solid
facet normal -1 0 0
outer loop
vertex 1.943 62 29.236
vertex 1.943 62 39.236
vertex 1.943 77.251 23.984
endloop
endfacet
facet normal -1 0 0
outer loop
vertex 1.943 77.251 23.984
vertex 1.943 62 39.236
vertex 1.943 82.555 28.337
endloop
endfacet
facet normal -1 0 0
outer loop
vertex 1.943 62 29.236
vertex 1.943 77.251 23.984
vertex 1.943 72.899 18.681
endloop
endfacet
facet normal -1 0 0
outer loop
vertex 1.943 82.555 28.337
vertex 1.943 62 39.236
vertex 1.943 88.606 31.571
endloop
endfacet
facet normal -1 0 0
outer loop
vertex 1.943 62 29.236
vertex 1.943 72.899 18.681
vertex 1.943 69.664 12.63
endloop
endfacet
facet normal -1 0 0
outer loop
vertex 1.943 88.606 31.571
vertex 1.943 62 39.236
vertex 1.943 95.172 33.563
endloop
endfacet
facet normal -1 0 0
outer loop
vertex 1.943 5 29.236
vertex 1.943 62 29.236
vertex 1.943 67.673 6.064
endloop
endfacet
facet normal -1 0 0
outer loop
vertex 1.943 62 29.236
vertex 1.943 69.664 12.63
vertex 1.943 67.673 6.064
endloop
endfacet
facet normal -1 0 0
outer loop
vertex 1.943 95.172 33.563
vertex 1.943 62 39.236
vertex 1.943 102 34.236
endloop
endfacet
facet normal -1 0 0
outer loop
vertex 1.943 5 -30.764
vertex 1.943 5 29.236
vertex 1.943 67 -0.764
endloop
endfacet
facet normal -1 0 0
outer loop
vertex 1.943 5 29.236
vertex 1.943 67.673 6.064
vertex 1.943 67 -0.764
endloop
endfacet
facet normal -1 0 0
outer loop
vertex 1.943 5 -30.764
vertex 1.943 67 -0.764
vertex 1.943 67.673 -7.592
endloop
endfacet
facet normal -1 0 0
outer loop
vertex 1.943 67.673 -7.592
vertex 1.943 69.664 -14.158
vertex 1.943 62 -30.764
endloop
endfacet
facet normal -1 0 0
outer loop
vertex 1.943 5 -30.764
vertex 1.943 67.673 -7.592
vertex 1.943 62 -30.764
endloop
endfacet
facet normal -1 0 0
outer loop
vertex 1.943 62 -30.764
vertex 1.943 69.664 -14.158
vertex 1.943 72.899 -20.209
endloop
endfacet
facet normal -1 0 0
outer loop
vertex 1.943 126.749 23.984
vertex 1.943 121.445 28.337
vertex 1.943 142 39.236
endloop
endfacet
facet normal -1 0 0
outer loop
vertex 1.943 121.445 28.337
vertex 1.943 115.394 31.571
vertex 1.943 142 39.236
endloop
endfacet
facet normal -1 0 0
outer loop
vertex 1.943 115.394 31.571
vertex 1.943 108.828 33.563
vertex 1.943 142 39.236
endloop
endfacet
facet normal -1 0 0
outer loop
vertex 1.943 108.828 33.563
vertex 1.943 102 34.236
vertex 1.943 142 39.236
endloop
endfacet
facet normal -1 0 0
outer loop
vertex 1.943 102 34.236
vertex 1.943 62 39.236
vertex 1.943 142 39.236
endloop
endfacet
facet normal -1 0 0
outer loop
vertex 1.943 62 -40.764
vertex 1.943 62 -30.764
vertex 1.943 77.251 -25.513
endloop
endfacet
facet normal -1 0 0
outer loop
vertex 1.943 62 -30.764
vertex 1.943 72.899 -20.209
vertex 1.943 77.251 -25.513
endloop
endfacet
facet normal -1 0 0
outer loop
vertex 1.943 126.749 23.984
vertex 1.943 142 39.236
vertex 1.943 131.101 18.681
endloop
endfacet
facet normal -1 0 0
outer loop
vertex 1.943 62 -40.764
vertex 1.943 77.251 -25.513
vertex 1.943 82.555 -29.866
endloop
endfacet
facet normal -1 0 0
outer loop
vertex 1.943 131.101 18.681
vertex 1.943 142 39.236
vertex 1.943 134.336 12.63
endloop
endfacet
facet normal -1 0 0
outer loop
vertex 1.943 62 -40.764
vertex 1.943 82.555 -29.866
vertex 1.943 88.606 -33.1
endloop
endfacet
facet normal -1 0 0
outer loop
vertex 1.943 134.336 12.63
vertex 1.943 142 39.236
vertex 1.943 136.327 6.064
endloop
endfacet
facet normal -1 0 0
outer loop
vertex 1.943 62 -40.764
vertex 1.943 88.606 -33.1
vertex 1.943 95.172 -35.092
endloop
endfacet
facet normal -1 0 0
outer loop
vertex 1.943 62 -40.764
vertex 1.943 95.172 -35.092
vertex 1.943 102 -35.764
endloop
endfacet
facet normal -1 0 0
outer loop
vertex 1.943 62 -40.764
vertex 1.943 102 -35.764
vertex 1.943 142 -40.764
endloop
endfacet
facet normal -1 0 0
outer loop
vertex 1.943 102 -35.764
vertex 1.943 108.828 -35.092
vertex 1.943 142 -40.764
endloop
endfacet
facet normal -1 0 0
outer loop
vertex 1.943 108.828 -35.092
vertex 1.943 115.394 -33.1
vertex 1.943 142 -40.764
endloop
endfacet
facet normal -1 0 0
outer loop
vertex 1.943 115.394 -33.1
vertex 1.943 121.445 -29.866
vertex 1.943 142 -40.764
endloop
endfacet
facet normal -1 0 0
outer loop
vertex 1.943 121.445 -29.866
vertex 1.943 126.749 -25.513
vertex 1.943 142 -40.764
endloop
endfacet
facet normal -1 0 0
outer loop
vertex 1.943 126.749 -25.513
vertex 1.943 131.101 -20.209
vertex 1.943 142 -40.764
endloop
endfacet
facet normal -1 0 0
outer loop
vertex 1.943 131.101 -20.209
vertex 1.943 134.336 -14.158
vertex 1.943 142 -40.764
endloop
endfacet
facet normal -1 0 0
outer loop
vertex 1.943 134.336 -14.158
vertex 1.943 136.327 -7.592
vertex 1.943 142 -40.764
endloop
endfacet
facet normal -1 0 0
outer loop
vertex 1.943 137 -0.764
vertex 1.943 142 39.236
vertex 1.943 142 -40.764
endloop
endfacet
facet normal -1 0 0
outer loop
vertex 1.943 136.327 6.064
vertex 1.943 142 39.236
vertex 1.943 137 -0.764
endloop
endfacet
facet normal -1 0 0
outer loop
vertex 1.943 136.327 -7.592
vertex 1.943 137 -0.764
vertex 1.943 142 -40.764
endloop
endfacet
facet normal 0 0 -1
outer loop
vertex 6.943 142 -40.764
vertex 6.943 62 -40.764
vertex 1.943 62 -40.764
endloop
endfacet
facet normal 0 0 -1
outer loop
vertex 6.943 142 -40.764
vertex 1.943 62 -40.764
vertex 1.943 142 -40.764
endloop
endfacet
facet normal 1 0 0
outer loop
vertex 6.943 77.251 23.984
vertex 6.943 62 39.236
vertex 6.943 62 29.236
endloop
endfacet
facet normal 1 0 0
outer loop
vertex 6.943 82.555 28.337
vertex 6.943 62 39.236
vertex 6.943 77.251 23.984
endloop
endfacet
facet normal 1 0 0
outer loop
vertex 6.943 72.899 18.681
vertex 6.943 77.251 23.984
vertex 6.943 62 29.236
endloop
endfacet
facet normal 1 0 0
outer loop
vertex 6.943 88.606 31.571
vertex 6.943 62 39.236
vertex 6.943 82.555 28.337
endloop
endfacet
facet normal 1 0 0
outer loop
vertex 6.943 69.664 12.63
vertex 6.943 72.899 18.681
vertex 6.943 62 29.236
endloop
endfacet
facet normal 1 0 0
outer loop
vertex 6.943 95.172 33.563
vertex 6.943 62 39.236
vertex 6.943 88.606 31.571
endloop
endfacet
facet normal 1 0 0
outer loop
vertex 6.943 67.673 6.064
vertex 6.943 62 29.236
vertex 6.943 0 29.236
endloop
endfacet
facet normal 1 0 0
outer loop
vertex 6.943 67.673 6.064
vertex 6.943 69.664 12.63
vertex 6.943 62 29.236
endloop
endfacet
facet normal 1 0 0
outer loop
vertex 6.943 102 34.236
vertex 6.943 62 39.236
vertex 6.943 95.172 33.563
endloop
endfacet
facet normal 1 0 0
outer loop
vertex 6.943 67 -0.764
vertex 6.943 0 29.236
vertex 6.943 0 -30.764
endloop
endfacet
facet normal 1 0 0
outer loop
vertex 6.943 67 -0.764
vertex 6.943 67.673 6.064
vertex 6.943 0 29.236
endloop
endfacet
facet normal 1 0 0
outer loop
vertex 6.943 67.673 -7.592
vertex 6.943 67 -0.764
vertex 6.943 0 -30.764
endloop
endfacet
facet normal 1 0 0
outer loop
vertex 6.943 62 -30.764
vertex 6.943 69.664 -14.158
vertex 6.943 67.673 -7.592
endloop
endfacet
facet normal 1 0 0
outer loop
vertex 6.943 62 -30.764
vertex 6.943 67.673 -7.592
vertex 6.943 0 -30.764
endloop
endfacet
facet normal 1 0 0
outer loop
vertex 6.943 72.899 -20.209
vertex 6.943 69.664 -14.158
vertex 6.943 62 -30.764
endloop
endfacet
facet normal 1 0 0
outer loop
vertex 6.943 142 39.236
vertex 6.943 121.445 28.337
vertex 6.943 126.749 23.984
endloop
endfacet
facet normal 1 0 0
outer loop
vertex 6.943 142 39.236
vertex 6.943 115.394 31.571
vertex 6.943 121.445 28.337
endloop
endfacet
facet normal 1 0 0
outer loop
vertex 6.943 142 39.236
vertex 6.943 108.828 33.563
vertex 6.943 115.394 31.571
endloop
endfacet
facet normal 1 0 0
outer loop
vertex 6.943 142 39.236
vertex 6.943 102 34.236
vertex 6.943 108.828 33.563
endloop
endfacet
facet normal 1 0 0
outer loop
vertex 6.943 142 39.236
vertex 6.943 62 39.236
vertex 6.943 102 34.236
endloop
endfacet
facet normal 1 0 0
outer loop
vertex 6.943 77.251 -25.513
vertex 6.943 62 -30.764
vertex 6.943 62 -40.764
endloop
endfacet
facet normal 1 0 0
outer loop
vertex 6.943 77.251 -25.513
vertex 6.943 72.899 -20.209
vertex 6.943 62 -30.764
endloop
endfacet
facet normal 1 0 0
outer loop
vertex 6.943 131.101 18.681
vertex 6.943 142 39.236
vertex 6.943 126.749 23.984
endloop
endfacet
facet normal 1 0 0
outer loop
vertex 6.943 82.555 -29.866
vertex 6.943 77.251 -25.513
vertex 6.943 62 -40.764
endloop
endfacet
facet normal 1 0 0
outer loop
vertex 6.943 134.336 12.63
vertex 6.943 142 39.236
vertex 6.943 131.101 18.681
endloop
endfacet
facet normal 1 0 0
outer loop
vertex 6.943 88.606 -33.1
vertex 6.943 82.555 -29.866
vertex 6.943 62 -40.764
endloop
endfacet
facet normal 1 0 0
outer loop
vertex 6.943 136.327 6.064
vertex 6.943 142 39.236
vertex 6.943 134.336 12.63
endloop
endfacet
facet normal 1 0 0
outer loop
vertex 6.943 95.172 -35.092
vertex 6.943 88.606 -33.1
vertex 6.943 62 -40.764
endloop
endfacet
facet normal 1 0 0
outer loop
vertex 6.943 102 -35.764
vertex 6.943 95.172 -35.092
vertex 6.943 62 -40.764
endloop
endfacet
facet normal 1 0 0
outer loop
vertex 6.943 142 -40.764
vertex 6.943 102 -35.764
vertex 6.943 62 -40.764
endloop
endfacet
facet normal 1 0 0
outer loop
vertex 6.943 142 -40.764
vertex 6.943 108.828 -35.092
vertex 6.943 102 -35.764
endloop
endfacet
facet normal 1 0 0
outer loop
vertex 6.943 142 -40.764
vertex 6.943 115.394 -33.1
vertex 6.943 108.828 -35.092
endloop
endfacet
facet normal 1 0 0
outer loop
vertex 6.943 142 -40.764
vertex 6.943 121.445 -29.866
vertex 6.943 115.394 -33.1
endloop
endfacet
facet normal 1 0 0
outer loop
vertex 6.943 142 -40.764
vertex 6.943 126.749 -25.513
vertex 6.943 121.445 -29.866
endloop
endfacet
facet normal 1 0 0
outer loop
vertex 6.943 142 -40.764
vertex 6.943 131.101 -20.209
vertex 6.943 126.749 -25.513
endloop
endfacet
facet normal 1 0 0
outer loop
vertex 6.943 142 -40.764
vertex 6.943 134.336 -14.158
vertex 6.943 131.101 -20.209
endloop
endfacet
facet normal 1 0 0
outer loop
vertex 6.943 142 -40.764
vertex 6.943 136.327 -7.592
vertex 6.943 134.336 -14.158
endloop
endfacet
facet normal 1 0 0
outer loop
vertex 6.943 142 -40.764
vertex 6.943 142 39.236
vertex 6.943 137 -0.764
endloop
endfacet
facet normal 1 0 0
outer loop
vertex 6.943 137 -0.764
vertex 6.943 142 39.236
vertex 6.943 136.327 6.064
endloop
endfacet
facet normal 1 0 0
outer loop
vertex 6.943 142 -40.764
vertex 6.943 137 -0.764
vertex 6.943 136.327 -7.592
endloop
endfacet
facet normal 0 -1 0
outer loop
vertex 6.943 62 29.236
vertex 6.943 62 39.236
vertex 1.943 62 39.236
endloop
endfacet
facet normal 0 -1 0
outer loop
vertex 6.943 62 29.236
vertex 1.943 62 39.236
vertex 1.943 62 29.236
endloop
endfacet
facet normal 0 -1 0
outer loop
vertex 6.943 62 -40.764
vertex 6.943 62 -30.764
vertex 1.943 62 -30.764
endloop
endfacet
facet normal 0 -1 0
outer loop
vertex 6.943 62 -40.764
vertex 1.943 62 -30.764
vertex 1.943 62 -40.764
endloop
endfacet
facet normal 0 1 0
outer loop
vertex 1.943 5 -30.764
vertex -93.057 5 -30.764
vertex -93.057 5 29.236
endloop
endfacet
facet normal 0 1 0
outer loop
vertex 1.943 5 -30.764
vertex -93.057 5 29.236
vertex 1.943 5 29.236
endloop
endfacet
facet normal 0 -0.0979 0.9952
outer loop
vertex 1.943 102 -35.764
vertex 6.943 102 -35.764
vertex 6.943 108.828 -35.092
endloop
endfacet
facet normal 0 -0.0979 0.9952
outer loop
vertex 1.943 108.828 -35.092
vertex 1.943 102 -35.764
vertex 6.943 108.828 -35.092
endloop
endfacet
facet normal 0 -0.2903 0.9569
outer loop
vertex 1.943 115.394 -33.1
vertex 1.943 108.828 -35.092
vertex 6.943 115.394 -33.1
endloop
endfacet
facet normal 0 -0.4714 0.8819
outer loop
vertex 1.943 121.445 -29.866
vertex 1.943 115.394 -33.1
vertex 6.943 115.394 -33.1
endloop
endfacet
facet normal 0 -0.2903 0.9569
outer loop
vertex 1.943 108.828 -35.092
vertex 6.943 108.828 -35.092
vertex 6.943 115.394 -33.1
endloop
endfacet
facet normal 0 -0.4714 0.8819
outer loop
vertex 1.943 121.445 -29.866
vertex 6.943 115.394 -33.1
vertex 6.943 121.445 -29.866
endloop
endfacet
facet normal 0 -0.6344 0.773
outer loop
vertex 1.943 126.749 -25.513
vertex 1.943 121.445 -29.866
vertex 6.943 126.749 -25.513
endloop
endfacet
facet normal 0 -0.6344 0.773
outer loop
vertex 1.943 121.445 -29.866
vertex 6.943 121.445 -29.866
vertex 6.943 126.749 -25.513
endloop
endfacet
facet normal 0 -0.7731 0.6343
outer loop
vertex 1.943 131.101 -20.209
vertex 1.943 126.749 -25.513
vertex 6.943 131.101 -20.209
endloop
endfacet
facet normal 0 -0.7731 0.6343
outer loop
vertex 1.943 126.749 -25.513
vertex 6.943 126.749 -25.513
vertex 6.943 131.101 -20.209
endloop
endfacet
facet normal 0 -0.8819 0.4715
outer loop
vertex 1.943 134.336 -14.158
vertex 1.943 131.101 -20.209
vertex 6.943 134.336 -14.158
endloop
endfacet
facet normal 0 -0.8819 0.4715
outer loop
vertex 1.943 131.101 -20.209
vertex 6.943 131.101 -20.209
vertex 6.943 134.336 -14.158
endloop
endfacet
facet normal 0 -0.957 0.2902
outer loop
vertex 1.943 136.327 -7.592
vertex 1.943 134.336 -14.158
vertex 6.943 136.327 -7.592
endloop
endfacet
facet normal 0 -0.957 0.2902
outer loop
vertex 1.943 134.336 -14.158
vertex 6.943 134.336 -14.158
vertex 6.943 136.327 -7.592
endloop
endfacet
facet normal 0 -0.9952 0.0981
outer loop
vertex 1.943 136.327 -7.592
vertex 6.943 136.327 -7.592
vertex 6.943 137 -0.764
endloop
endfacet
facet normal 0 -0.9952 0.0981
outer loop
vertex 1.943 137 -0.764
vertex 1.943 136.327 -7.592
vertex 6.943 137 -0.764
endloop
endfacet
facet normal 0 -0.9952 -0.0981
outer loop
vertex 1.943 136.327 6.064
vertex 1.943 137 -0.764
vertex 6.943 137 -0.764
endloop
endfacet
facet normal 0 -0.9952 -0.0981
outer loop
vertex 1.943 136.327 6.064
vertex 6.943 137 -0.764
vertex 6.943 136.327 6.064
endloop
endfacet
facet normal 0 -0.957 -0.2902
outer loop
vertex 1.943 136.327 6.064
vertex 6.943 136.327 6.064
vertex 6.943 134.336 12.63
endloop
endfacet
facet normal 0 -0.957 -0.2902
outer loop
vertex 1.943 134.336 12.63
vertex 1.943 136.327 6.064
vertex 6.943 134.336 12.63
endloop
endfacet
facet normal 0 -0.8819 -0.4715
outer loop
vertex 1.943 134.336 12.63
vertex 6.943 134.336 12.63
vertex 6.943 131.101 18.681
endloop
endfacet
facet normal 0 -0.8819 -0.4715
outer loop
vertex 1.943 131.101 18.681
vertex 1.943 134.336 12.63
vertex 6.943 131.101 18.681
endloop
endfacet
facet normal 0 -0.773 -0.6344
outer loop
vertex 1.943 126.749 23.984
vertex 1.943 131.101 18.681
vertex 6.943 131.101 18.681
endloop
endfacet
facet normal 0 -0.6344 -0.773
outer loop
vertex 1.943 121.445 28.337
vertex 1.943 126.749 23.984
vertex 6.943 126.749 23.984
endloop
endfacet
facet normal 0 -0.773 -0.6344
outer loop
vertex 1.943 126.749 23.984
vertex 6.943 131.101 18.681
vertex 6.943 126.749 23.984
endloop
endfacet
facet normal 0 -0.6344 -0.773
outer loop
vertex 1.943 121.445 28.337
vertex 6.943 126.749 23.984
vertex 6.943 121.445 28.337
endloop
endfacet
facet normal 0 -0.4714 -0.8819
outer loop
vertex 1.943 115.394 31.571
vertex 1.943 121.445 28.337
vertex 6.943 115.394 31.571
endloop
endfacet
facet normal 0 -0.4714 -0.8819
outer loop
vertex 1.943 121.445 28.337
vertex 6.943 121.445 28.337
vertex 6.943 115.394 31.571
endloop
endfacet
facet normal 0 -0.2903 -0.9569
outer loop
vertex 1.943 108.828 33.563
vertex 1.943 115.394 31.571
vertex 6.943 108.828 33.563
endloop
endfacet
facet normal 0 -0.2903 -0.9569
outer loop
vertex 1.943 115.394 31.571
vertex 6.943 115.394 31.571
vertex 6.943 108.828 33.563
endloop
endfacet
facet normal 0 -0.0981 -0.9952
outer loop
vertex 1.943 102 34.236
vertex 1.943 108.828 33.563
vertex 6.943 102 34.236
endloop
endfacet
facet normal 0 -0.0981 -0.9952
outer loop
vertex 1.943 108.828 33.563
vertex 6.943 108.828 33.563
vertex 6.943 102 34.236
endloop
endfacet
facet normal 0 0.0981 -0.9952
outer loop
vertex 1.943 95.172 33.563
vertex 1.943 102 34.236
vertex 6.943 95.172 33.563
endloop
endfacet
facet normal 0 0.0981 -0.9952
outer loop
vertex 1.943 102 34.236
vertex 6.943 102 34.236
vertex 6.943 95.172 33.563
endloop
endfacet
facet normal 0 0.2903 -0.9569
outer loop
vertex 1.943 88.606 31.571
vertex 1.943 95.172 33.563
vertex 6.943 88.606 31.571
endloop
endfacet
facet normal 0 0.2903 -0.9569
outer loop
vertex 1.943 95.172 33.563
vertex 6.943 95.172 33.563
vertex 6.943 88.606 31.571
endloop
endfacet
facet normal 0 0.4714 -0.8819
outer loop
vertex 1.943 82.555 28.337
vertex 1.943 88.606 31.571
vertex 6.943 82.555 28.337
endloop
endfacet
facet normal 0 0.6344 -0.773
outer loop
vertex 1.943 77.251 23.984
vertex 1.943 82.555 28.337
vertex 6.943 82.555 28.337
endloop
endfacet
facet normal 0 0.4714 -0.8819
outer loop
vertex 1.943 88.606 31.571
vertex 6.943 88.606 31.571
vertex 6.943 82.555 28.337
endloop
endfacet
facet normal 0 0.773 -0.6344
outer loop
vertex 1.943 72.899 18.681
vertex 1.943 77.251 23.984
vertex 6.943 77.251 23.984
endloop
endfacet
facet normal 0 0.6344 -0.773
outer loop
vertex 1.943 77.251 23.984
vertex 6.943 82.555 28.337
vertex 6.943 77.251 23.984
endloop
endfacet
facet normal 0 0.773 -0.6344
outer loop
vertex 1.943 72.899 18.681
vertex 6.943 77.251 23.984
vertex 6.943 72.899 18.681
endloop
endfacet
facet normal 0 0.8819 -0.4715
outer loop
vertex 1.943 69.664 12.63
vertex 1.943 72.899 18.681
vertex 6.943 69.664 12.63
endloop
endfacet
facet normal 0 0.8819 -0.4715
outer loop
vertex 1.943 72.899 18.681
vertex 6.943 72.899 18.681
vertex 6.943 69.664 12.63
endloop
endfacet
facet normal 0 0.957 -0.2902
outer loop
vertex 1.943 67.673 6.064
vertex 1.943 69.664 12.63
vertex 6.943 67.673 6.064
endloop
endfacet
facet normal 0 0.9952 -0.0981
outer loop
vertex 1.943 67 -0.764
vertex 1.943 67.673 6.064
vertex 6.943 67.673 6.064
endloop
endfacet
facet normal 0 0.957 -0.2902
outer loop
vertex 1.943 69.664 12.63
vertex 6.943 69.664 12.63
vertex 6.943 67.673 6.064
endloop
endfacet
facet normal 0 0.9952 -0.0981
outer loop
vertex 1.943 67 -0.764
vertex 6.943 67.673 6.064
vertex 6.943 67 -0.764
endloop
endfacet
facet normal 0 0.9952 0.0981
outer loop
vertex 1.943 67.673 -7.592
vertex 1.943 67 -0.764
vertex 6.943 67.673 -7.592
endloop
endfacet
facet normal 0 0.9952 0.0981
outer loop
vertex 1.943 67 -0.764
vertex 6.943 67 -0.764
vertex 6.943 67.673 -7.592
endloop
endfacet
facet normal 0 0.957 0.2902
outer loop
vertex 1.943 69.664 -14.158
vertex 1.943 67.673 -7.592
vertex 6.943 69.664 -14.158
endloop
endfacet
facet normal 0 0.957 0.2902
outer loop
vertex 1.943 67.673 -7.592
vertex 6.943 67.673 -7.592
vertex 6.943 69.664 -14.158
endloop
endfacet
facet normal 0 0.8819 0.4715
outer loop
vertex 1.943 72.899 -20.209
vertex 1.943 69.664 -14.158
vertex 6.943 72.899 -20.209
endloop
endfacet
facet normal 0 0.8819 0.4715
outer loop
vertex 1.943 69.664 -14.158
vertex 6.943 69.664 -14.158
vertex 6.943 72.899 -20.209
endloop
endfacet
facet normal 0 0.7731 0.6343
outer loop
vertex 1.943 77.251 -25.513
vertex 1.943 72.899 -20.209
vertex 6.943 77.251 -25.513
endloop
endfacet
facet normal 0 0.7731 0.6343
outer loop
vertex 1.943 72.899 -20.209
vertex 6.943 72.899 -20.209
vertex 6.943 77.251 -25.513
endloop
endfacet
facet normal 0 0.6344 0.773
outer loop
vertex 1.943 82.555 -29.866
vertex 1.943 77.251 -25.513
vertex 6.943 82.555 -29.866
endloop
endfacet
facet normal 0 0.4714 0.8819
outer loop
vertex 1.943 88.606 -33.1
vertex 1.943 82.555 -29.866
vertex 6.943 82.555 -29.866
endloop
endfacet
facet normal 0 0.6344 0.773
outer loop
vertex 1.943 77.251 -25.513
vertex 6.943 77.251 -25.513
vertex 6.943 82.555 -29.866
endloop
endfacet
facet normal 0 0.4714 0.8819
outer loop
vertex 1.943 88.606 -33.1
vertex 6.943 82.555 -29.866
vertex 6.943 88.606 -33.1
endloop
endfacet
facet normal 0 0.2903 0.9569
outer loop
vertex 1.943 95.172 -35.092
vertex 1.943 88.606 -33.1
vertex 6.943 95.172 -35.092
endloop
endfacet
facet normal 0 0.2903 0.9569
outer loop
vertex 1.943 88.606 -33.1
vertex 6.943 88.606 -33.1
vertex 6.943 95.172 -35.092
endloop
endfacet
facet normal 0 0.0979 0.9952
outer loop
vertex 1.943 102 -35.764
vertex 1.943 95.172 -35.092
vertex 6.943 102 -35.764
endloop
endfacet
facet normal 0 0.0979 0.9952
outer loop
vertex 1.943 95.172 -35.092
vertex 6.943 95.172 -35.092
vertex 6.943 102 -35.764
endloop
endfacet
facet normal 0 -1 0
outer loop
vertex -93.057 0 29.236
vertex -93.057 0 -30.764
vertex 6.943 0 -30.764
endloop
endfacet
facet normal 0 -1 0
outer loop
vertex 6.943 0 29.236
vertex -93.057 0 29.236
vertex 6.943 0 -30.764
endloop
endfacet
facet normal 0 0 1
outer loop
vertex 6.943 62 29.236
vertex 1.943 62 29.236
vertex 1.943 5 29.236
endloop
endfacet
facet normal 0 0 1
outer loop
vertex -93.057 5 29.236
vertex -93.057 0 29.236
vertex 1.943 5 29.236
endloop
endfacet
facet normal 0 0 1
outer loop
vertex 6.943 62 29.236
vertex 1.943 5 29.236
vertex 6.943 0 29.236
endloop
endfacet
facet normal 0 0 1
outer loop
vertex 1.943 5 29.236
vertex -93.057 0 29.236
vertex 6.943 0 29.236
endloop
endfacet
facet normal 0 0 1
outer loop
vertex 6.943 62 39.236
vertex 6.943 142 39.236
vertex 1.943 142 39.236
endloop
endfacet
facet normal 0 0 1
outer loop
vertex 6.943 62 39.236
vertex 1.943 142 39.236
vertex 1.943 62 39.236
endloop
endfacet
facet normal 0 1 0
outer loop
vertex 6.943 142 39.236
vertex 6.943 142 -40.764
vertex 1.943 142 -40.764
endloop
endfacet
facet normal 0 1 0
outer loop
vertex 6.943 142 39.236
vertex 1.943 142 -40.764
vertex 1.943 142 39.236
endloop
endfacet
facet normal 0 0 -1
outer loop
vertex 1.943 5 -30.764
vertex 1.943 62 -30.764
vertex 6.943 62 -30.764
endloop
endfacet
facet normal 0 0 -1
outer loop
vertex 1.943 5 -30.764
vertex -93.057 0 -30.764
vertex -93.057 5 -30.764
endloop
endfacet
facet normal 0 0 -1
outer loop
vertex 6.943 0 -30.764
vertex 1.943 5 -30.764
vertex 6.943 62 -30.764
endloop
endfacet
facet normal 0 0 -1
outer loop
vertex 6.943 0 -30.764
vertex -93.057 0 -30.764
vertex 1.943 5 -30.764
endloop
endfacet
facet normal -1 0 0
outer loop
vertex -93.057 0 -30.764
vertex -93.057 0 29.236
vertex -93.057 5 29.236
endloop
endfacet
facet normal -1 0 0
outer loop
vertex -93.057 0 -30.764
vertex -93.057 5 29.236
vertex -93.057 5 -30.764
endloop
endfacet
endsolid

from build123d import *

# Parameters (mm, degrees)
SKETCH1_W           = 100
SKETCH1_H           = 60
BOSS_EXTRUDE1_DEPTH = 5
SKETCH2_W           = 5
SKETCH2_H           = 60
BOSS_EXTRUDE2_DEPTH = 57
BOSS_EXTRUDE3_DEPTH = 5
SKETCH5_R           = 35
CUT_EXTRUDE1_DEPTH  = 5


with BuildPart() as part:
    # Sketch1 → Boss-Extrude1 (new body)
    with BuildSketch(Plane(origin=(0, 0, 0), x_dir=(1, 0, 0), z_dir=(0, 1, 0))):
        with Locations((-43.057324841, 0.76433121)):
            Rectangle(SKETCH1_W, SKETCH1_H)
    extrude(amount=BOSS_EXTRUDE1_DEPTH)

    # Sketch2 → Boss-Extrude2 (add)
    with BuildSketch(Plane(origin=(0, 5, 0), x_dir=(1, 0, 0), z_dir=(0, 1, 0))):
        with Locations((4.442675159, 0.76433121)):
            Rectangle(SKETCH2_W, SKETCH2_H)
    extrude(amount=BOSS_EXTRUDE2_DEPTH)

    # Sketch4 → Boss-Extrude3 (add)
    with BuildSketch(Plane(origin=(6.942675159, 0, 0), x_dir=(0, 0, -1), z_dir=(1, 0, 0))):
        Polygon((-29.23566879, 62), (40.76433121, 62), (40.76433121, 142), (-39.23566879, 142), (-39.23566879, 62), align=None)
    extrude(amount=-BOSS_EXTRUDE3_DEPTH)

    # Sketch5 → Cut-Extrude1 (cut)
    with BuildSketch(Plane(origin=(6.942675159, 0, 0), x_dir=(0, 0, -1), z_dir=(1, 0, 0))):
        with Locations((0.76433121, 102)):
            Circle(SKETCH5_R)
    extrude(amount=-CUT_EXTRUDE1_DEPTH, mode=Mode.SUBTRACT)


solid = part.part
